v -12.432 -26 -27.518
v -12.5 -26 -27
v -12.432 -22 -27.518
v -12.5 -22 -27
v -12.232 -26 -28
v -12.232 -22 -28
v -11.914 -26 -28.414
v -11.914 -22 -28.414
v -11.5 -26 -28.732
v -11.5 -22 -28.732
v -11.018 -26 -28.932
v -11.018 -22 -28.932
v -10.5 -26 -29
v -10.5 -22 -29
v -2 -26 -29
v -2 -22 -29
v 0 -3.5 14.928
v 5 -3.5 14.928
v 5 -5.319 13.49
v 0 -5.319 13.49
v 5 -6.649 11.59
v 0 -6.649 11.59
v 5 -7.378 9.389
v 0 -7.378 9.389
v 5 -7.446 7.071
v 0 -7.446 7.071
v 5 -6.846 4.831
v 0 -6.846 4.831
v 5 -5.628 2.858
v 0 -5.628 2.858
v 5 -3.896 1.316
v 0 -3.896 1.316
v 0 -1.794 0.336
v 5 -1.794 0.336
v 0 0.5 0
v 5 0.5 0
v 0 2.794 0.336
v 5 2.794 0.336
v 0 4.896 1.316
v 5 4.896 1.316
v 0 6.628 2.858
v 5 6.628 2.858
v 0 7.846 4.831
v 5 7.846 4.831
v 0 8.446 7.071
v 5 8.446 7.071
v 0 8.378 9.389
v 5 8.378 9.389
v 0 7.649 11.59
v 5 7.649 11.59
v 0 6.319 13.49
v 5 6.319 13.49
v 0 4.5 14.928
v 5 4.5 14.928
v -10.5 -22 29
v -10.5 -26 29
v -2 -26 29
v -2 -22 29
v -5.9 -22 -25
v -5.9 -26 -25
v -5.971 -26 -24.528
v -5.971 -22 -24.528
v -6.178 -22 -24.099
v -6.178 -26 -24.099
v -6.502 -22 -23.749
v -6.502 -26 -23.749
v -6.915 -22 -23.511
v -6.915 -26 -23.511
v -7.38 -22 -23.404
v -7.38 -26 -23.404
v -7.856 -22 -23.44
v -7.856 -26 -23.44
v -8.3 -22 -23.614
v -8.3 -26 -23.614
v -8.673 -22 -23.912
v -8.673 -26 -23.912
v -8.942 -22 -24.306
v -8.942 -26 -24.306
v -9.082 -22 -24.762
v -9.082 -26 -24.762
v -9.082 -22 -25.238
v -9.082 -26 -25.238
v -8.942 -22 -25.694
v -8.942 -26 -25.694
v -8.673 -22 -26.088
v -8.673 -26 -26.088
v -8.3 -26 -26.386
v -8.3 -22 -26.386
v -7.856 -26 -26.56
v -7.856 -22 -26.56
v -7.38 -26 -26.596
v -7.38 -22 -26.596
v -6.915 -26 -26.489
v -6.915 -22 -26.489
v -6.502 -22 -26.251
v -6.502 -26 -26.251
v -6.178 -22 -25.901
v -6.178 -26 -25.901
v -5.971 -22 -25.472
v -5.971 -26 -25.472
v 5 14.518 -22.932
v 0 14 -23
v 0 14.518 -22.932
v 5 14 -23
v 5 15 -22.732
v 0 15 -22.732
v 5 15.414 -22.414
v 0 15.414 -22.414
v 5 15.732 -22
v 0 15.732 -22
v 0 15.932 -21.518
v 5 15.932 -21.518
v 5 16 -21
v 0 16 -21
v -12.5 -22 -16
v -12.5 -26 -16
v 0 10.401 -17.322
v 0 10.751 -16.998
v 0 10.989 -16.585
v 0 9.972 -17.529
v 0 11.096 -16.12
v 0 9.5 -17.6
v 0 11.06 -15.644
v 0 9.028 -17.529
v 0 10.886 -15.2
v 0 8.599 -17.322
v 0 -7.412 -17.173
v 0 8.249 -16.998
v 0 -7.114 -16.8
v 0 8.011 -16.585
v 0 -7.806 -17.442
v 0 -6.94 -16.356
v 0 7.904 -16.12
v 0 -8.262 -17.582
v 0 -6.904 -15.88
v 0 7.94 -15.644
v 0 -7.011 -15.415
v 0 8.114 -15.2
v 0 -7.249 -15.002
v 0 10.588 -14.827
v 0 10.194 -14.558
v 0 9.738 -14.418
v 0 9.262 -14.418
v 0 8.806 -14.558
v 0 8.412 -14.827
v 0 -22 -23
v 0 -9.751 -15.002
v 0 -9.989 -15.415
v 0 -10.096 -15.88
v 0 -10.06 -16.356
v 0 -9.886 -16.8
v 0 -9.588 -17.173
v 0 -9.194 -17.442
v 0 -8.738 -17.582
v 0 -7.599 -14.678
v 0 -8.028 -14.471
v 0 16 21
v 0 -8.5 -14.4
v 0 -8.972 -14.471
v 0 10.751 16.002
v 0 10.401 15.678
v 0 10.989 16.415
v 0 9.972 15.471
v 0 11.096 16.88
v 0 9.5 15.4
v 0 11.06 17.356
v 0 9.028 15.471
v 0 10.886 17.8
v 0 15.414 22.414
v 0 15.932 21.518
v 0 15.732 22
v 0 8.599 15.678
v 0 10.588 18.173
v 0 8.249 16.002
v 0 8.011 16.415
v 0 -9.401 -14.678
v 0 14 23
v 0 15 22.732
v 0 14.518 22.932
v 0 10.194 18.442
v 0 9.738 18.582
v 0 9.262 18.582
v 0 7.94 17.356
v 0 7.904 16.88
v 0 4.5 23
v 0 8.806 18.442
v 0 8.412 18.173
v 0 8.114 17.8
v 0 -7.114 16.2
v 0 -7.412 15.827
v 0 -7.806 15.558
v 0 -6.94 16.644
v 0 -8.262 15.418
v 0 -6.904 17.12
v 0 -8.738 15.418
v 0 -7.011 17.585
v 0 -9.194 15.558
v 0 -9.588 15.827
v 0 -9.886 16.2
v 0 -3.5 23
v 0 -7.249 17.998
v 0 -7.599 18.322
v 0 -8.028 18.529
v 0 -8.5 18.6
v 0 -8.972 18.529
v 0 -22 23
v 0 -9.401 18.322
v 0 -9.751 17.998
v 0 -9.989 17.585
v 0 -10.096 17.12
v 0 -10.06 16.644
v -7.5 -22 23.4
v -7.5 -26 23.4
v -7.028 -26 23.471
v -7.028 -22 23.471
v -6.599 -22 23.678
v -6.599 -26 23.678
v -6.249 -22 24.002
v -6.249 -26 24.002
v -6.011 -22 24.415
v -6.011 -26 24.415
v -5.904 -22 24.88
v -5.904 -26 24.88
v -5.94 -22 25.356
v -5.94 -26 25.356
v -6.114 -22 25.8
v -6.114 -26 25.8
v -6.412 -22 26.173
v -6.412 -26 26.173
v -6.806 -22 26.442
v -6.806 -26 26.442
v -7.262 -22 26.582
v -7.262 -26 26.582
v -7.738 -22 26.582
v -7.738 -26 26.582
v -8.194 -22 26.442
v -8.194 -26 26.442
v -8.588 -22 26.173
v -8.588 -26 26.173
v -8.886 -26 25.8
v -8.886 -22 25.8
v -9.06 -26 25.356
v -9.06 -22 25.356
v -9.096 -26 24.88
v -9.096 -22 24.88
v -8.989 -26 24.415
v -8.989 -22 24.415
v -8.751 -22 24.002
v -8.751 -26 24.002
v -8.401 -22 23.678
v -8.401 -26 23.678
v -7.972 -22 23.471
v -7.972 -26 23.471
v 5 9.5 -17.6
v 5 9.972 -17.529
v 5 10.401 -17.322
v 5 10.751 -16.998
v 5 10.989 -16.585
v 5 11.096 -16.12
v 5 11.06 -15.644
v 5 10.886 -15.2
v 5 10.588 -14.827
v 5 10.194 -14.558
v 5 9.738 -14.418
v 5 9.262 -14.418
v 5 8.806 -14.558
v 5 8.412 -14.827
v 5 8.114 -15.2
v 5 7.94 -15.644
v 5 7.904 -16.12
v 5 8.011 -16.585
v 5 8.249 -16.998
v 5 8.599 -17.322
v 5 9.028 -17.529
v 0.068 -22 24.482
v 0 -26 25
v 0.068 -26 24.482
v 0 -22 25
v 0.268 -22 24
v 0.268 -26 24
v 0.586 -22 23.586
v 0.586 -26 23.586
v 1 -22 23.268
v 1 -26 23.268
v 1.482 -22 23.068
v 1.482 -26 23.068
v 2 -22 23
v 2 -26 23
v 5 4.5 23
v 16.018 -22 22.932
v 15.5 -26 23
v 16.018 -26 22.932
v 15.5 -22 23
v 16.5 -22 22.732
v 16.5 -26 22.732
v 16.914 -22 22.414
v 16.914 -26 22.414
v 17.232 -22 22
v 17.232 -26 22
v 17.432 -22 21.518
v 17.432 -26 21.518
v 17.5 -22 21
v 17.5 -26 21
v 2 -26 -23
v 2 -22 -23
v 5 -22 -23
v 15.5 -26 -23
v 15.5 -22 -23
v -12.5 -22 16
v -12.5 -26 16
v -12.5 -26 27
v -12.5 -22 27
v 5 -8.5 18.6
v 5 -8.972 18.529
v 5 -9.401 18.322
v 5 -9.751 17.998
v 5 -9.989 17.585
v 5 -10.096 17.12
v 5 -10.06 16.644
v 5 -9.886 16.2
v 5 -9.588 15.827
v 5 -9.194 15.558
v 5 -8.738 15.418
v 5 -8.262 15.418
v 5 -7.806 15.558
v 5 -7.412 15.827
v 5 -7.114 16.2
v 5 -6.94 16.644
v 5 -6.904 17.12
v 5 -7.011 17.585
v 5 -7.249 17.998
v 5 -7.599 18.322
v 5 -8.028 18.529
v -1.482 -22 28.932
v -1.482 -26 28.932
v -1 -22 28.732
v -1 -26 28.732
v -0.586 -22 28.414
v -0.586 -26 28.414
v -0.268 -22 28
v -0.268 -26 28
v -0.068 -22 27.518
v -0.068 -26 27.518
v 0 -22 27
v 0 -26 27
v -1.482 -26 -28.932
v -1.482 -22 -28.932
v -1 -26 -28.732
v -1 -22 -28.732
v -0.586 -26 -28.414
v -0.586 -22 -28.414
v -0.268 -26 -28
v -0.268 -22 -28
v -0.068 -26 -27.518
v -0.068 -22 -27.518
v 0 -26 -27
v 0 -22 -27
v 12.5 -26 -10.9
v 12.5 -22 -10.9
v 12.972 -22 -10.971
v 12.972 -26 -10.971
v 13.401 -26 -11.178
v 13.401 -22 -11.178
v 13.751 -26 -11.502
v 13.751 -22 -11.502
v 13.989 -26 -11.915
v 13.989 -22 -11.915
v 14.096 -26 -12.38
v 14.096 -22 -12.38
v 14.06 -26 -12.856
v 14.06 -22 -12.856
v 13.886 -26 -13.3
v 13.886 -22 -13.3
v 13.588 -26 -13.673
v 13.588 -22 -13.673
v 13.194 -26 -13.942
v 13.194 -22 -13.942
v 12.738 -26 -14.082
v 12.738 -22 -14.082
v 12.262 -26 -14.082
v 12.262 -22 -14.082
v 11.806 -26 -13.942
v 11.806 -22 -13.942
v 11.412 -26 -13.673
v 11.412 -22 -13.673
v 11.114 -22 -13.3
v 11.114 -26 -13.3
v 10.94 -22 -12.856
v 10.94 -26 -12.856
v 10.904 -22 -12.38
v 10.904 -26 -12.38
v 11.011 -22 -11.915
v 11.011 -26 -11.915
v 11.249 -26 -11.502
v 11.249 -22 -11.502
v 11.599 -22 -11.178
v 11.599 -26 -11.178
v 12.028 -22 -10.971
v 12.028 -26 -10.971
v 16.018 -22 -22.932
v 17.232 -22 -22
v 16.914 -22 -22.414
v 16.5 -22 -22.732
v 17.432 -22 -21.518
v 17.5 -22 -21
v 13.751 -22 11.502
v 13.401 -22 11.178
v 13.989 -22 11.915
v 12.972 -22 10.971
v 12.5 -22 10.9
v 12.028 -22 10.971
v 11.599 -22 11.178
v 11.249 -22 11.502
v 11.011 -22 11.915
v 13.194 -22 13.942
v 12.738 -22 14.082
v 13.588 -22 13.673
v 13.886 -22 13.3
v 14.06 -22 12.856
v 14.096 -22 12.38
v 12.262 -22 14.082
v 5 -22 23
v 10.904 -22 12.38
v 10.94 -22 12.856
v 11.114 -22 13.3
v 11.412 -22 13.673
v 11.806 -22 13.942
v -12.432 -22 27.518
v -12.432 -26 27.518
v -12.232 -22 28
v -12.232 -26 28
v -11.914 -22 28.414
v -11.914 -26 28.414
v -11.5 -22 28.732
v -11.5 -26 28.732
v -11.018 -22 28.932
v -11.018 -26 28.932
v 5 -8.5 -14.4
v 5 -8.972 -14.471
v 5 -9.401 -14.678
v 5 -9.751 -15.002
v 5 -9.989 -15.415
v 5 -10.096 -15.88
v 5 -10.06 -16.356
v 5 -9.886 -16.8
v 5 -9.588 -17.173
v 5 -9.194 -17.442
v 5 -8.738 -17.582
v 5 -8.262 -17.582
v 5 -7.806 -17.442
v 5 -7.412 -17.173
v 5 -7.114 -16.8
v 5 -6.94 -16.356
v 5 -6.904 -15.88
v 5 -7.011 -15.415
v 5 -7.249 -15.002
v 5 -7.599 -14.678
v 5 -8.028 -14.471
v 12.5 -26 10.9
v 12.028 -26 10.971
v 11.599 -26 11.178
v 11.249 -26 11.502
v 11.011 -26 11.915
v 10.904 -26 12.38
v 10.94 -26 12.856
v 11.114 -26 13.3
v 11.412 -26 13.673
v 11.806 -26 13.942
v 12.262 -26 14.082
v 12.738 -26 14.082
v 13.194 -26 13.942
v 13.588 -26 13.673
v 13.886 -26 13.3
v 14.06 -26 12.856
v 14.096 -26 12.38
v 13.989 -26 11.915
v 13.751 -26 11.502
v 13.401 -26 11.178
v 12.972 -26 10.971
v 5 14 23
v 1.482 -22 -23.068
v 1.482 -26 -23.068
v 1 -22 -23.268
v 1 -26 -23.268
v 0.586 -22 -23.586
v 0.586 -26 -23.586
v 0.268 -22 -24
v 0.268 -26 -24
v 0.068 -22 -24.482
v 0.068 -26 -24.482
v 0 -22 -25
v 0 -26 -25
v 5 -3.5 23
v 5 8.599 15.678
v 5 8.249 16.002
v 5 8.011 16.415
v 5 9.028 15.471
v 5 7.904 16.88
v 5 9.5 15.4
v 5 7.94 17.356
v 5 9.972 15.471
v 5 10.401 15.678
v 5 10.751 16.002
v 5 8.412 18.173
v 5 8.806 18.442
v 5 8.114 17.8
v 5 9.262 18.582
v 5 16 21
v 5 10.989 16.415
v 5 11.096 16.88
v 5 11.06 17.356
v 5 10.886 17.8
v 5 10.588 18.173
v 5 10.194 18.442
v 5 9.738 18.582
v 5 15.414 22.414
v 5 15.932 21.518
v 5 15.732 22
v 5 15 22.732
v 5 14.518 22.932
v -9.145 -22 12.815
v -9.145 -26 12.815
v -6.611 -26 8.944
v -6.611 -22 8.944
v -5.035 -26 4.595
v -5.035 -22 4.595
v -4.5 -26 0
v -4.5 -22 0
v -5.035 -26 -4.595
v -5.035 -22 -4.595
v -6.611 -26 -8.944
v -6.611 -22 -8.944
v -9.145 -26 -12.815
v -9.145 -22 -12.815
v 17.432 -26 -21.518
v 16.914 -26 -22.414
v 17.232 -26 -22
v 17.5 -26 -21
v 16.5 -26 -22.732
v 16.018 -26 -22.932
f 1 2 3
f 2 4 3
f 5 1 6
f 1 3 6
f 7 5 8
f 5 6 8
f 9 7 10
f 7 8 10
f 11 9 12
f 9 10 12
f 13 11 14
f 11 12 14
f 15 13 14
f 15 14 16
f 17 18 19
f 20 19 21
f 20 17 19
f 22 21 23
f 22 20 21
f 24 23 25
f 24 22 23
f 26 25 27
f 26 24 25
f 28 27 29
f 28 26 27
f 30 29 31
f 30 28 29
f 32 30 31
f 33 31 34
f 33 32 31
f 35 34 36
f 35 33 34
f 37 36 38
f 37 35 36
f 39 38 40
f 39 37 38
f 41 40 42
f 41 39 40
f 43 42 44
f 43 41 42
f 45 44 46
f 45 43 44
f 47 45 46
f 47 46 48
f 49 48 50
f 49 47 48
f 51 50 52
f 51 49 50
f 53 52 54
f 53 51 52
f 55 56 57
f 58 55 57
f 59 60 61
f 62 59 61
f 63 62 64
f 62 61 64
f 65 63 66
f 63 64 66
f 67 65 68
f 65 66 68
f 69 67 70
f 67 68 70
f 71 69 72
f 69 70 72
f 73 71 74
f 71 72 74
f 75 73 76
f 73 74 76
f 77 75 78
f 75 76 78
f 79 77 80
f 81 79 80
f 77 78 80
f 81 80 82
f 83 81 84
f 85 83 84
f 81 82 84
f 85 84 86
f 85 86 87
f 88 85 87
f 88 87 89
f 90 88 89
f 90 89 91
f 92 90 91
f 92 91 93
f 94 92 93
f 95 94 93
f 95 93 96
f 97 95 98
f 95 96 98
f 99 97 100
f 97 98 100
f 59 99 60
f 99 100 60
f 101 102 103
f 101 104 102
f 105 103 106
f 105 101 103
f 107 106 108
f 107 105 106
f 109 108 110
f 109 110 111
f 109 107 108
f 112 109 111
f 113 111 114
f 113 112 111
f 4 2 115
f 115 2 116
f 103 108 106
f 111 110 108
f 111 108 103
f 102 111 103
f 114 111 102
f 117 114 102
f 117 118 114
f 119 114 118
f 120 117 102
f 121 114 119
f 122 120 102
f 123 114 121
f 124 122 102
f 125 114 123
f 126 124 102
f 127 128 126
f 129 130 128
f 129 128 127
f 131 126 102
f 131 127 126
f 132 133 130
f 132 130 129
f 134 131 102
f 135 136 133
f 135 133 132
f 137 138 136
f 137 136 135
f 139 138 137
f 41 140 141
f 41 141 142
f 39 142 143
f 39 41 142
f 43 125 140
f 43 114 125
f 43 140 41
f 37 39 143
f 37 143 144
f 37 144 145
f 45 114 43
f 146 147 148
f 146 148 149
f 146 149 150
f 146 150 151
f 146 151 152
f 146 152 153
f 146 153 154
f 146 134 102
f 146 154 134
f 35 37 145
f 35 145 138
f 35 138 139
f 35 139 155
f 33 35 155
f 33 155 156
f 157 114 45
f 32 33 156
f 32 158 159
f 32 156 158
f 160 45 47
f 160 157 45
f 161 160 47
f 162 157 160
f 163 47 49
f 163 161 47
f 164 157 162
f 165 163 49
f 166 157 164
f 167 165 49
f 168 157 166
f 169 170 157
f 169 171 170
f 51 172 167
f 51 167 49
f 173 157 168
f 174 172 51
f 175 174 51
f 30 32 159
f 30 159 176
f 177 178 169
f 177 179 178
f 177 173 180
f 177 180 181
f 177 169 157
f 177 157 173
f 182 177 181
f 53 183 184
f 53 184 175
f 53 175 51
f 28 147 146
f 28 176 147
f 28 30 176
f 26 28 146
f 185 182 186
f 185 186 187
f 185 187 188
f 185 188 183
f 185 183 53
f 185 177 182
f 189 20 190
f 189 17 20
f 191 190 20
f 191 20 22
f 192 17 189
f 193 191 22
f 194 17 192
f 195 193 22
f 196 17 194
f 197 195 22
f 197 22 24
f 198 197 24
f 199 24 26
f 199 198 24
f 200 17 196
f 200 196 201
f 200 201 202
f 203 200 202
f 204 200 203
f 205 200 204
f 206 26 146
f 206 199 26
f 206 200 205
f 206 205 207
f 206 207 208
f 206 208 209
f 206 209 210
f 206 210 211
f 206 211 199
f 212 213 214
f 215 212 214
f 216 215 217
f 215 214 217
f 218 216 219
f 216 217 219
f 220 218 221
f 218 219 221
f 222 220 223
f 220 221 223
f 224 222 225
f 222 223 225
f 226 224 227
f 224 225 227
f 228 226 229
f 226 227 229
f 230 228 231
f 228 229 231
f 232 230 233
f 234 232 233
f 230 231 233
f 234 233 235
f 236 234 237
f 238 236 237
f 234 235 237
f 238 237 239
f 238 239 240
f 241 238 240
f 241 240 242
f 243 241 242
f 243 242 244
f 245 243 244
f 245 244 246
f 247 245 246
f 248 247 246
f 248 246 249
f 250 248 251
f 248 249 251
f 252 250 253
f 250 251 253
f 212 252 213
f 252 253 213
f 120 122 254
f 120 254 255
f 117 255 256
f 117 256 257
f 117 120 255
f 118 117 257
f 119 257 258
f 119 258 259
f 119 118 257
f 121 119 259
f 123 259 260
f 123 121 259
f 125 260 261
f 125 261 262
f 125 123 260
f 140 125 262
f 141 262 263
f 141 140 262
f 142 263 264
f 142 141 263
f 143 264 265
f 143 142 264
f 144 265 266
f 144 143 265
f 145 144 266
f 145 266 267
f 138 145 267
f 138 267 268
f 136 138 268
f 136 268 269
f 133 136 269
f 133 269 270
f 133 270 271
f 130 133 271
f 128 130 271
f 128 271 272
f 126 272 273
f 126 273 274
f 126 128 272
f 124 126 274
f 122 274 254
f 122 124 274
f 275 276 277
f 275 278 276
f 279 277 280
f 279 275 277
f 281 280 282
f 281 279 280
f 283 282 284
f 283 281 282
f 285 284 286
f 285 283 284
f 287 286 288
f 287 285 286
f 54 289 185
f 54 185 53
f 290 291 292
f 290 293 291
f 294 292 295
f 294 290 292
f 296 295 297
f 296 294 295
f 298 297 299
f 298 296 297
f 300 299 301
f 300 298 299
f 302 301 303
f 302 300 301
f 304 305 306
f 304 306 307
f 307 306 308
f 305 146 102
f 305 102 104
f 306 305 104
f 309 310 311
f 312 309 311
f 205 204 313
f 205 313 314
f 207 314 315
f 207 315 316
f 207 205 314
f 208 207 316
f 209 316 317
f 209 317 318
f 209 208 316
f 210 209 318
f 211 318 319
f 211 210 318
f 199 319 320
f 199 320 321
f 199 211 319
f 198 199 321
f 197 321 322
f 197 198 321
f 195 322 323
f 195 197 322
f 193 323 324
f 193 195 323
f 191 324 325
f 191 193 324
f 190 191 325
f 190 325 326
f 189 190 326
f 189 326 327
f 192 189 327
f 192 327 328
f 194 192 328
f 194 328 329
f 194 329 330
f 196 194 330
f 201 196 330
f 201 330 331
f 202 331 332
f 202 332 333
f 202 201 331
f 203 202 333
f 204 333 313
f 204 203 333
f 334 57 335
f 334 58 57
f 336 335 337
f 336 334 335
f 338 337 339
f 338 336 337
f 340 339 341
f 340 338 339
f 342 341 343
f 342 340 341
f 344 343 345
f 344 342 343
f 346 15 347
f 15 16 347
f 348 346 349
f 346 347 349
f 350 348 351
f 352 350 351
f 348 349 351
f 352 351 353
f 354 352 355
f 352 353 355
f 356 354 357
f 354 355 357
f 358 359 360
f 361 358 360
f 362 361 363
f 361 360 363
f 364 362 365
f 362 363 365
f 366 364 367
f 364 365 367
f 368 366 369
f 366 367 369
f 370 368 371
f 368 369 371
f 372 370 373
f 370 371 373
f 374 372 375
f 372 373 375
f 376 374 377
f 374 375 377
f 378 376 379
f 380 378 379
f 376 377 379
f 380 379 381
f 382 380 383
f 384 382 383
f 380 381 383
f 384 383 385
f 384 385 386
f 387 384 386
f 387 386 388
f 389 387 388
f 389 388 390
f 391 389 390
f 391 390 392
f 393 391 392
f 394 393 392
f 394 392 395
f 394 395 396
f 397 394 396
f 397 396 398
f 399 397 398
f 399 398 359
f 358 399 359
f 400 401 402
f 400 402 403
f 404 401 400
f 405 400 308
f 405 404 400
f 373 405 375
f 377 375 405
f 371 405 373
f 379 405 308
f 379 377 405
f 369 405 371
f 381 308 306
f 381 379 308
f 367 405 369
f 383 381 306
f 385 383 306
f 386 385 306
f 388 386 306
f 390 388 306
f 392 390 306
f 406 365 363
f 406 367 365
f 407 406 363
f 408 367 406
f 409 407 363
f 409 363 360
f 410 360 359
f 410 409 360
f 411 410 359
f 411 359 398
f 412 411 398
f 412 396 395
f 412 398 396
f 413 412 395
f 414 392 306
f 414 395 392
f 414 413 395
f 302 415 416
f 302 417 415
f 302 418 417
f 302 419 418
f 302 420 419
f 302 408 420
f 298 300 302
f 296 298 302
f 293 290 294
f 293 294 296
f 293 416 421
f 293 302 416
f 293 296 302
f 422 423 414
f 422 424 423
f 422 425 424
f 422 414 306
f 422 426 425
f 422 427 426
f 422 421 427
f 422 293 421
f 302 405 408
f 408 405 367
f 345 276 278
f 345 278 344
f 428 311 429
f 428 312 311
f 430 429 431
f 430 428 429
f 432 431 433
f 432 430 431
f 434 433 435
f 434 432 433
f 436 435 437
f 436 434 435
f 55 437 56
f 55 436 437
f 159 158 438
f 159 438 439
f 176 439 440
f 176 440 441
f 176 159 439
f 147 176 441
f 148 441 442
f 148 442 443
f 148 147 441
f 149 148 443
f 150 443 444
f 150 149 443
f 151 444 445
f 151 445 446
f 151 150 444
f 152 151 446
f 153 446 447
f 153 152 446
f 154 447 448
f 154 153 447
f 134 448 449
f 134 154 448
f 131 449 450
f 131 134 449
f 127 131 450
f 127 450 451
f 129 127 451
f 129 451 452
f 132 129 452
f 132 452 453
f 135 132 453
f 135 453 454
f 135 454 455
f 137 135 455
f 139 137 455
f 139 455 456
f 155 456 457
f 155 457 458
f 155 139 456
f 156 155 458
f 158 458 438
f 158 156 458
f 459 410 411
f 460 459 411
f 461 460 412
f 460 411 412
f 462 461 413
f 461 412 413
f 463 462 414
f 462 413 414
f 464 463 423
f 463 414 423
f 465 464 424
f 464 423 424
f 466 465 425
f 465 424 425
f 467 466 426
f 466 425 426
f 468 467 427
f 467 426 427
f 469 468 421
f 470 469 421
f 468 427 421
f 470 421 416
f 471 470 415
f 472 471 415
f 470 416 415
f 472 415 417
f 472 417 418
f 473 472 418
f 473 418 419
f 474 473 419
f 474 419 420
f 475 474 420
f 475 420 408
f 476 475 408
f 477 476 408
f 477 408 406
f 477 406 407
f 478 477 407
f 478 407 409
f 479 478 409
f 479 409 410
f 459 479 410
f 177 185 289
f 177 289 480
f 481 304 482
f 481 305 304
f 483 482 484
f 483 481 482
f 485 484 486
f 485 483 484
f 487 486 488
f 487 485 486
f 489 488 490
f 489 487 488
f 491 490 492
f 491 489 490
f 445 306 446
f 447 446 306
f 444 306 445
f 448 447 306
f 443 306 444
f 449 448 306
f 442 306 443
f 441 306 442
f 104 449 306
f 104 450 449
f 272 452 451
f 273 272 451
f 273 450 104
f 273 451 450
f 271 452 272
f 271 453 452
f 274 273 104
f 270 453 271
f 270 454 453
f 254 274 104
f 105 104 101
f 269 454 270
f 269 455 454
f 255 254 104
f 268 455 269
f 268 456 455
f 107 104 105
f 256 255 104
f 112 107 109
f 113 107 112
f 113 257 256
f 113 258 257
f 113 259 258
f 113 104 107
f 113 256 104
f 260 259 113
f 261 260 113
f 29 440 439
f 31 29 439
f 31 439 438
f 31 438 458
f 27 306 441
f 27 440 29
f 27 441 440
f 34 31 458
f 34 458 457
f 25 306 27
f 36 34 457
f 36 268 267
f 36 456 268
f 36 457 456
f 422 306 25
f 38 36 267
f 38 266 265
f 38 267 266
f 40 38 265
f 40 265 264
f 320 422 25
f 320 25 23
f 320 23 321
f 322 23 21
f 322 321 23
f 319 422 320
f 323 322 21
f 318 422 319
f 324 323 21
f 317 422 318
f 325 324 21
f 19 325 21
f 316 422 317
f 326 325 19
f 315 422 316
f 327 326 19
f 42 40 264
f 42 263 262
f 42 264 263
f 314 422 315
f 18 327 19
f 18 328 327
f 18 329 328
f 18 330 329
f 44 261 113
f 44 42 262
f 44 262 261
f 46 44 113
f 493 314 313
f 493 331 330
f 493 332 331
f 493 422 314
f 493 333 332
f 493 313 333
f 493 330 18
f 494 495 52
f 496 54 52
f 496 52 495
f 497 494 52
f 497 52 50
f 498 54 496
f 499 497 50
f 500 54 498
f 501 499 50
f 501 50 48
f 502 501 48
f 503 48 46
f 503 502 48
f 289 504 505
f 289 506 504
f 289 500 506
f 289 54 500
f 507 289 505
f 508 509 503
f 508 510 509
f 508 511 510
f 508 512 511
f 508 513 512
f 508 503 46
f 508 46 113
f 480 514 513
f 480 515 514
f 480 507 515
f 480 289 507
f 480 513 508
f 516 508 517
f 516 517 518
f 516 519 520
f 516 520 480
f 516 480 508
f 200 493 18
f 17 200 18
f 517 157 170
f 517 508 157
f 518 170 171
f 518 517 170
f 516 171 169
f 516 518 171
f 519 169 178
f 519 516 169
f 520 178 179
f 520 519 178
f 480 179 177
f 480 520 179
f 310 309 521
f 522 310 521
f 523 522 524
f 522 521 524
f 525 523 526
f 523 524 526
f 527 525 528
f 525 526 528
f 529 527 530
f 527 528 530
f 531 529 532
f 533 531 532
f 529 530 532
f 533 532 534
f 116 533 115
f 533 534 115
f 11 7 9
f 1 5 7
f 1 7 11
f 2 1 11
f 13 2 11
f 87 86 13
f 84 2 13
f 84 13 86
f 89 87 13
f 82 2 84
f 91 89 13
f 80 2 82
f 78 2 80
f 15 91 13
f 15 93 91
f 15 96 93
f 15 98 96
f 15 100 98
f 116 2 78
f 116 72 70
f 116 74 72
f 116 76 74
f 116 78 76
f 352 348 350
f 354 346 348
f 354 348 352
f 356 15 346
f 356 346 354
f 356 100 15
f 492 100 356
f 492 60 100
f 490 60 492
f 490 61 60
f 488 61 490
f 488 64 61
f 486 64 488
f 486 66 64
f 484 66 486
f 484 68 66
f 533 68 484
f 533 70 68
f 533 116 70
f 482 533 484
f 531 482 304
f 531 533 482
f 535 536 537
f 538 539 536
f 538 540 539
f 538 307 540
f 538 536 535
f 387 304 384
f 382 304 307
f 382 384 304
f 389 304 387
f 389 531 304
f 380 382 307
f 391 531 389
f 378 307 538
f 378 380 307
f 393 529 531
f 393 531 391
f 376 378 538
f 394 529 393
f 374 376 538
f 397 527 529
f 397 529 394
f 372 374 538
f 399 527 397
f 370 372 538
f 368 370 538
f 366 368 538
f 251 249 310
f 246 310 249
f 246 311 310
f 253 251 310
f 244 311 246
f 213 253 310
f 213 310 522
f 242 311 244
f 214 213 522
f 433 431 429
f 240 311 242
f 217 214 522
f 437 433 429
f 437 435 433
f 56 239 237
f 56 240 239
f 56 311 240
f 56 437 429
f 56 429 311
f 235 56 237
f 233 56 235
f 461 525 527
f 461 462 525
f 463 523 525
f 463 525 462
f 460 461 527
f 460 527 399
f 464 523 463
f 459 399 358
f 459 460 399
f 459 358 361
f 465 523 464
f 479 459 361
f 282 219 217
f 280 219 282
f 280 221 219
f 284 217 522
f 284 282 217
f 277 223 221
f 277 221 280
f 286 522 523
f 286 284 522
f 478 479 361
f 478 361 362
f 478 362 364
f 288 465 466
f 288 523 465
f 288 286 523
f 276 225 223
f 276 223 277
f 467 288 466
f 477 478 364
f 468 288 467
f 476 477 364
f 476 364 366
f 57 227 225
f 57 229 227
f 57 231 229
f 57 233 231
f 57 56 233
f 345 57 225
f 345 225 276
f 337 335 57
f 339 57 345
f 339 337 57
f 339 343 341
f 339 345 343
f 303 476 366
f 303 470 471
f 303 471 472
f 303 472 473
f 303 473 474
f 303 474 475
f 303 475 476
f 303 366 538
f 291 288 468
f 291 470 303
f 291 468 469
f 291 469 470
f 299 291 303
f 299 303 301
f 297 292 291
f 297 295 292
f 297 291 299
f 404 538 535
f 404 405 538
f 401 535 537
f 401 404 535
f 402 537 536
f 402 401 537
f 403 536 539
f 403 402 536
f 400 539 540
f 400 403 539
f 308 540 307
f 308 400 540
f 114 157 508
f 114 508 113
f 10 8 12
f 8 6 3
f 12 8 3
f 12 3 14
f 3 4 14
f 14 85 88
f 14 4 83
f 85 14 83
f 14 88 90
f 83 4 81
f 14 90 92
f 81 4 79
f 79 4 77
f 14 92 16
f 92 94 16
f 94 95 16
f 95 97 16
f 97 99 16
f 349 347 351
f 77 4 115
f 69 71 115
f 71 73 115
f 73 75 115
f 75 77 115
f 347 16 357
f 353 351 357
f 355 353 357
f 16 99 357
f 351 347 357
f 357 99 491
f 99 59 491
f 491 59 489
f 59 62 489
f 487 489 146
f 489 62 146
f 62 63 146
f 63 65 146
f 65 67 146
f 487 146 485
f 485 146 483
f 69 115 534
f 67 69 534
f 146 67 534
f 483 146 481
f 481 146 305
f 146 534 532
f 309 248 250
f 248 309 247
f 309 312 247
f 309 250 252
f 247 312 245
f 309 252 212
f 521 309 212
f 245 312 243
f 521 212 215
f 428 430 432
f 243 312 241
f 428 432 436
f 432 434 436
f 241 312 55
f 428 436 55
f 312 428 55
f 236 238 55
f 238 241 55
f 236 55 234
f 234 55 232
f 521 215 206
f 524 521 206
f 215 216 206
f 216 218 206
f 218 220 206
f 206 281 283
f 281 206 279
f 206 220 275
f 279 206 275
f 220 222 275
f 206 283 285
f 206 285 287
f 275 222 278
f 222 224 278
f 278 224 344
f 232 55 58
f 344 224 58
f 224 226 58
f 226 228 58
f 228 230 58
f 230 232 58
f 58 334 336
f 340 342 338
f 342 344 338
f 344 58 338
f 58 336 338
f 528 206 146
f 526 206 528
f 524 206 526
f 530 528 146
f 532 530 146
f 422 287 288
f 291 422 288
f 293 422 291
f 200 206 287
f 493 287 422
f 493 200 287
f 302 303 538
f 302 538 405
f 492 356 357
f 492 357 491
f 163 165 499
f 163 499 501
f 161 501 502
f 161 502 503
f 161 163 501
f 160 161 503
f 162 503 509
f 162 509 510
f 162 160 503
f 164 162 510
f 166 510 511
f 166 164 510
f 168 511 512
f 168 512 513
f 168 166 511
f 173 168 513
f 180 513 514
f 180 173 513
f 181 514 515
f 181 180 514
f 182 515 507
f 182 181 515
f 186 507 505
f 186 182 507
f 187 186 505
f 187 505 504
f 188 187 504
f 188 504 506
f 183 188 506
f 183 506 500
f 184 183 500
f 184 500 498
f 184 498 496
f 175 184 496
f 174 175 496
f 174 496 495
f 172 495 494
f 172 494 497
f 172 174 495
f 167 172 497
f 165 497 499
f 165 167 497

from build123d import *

# Parameters (mm, degrees)
SKETCH1_W           = 46
SKETCH1_H           = 32
SKETCH1_R           = 1.6
SKETCH1_R_2         = 8
EXTRUDE1_DEPTH      = 5
SKETCH2_W           = 10
SKETCH2_H           = 8
EXTRUDE2_DEPTH      = 29.460498942
EXTRUDE3_DEPTH      = 23
SKETCH4_R           = 1.6
EXTRUDE4_DEPTH      = 48.741491389
SKETCH_1_W          = 12.5
SKETCH_1_H          = 58
SKETCH_1_R          = 1.6
EXTRUDE_1_DEPTH     = 4
CUT_EXTRUDE_1_DEPTH = 10
FILLET_1_R          = 2


with BuildPart() as part:
    # Sketch1 → Extrude1 (new body)
    with BuildSketch(Plane(origin=(0, 0, 0), x_dir=(0, 0, -1), z_dir=(1, 0, 0))):
        Rectangle(SKETCH1_W, SKETCH1_H)
        with Locations((16, 9.5)):
            Circle(SKETCH1_R, mode=Mode.SUBTRACT)
        with Locations((-17, 9.5)):
            Circle(SKETCH1_R, mode=Mode.SUBTRACT)
        with Locations((-8, 0.5)):
            Circle(SKETCH1_R_2, mode=Mode.SUBTRACT)
        with Locations(Location((-17, -8.5, 0), (0, 0, 180))):
            Circle(SKETCH1_R, mode=Mode.SUBTRACT)
        with Locations(Location((16, -8.5, 0), (0, 0, 180))):
            Circle(SKETCH1_R, mode=Mode.SUBTRACT)
    extrude(amount=EXTRUDE1_DEPTH)

    # Sketch2 → Extrude2 (cut, through all)
    with BuildSketch(Plane(origin=(5, 0, 0), x_dir=(0, 0, -1), z_dir=(1, 0, 0))):
        with Locations((-18, 0.5)):
            Rectangle(SKETCH2_W, SKETCH2_H)
    extrude(amount=-EXTRUDE2_DEPTH, mode=Mode.SUBTRACT)

    # Sketch3 → Extrude3 (add, symmetric)
    with BuildSketch(Plane.XY):
        Polygon((0, -16), (0, -22), (-12.5, -22), (-12.5, -26), (17.5, -26), (17.5, -22), (5, -22), (5, -16), align=None)
    extrude(amount=EXTRUDE3_DEPTH, both=True)

    # Sketch4 → Extrude4 (cut, through all)
    with BuildSketch(Plane(origin=(0, -22, 0), x_dir=(1, 0, 0), z_dir=(0, 1, 0))):
        with Locations(Location((-7.5, -12.5, 0), (0, 0, 270))):
            Circle(SKETCH4_R)
        with Locations(Location((12.5, -12.5, 0), (0, 0, 90))):
            Circle(SKETCH4_R)
        with Locations(Location((-7.5, 12.5, 0), (0, 0, 90))):
            Circle(SKETCH4_R)
        with Locations(Location((12.5, 12.5, 0), (0, 0, 270))):
            Circle(SKETCH4_R)
    extrude(amount=-EXTRUDE4_DEPTH, mode=Mode.SUBTRACT)

    # 草图1 → 凸台-拉伸1 (add)
    with BuildSketch(Plane.XZ.offset(26)):
        with Locations((-6.25, 0)):
            Rectangle(SKETCH_1_W, SKETCH_1_H)
        with Locations((-7.5, -25)):
            Circle(SKETCH_1_R, mode=Mode.SUBTRACT)
        with Locations(Location((-7.5, 25, 0), (0, 0, 270))):
            Circle(SKETCH_1_R, mode=Mode.SUBTRACT)
    extrude(amount=-EXTRUDE_1_DEPTH)

    # 草图2 → 切除-拉伸1 (cut)
    with BuildSketch(Plane(origin=(0, -22, 0), x_dir=(1, 0, 0), z_dir=(0, 1, 0))):
        with BuildLine():
            Line((-12.5, 16), (-12.5, -16))
            ThreePointArc((-12.5, -16), (-4.5, 0), (-12.5, 16))
        make_face()
    extrude(amount=-CUT_EXTRUDE_1_DEPTH, mode=Mode.SUBTRACT)

    # 圆角1
    fillet_1_edges = [part.edges().sort_by_distance(p)[0] for p in [
        (0, -24, 29),
        (-12.5, -24, -29),
        (0, -24, -29),
        (0, -24, -23),
        (0, -24, 23),
        (-12.5, -24, 29),
        (17.5, -24, -23),
        (17.5, -24, 23),
        (2.5, 16, 23),
        (2.5, 16, -23),
    ]]
    fillet(fillet_1_edges, radius=FILLET_1_R)


solid = part.part
